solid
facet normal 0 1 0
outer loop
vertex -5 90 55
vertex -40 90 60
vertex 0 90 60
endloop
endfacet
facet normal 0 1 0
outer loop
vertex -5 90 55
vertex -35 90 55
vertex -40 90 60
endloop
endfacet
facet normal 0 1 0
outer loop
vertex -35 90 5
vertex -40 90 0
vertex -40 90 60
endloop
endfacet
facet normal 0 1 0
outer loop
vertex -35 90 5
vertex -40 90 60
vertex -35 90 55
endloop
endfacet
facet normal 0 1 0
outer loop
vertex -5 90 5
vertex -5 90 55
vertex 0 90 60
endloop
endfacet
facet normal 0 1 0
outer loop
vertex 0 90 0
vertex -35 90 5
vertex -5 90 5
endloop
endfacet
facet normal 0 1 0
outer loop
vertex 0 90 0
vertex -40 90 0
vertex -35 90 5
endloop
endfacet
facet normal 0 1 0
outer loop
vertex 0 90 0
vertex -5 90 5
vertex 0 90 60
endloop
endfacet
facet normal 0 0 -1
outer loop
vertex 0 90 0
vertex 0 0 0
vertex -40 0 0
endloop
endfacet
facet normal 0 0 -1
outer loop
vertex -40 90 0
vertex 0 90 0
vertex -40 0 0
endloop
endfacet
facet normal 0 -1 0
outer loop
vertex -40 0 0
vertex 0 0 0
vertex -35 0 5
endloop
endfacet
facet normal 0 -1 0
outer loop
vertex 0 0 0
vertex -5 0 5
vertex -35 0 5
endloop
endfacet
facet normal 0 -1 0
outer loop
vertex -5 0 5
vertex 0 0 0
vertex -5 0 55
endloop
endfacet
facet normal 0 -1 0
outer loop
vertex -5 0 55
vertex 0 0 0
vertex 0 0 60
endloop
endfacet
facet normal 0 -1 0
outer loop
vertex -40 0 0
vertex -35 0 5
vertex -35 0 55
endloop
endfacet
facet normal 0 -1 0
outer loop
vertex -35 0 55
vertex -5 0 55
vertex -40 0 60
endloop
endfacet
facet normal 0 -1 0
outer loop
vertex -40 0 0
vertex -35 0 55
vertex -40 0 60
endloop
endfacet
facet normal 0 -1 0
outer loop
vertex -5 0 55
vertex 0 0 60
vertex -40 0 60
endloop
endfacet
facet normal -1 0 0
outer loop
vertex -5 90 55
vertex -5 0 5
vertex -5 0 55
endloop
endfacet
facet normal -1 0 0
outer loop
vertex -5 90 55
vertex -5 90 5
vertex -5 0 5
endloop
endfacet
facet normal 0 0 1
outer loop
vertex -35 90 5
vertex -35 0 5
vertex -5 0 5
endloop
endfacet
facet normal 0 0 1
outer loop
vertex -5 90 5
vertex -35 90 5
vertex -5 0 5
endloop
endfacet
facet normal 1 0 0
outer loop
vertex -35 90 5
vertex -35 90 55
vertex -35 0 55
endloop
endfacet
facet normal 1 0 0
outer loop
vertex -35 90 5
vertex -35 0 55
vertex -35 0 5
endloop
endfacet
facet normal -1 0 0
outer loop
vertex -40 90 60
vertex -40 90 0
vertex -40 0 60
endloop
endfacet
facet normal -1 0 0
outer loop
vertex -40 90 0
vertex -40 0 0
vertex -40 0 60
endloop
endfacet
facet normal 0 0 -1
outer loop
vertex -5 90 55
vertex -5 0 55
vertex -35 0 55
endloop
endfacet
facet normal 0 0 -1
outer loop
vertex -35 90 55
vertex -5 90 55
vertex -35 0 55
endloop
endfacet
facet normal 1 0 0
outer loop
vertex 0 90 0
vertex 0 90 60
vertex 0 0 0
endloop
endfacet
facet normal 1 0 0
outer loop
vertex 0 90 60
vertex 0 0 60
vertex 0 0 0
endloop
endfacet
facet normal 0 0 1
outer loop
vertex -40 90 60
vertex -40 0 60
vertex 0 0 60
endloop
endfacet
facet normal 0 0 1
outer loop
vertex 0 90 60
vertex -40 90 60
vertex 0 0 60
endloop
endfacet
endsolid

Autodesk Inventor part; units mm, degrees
ref_plane "YZ Plane" through (0, 0, 0) normal (1, 0, 0) x (0, 1, 0)
ref_plane "XZ Plane" through (0, 0, 0) normal (0, 1, 0) x (-1, 0, 0)
ref_plane "XY Plane" through (0, 0, 0) normal (0, 0, 1) x (1, 0, 0)
sketch "Эскиз1" plane through (0, 0, 0) normal (0, 1, 0) x (-1, 0, 0)
  line L0 (0, 0) -> (40, 0)
  line L1 (40, 0) -> (40, 60)
  line L2 (40, 60) -> (0, 60)
  line L3 (0, 60) -> (0, 0)
  dimension "d0" = 60
  dimension "d1" = 40
extrude "Выдавливание1" add sketch "Эскиз1" along normal blind 190
sketch "Эскиз2" plane through (0, 190, 0) normal (0, 1, 0) x (1, 0, 0)
  line L0 (-35, -5) -> (-5, -5)
  line L1 (-5, -5) -> (-5, -55)
  line L2 (-5, -55) -> (-35, -55)
  line L3 (-35, -55) -> (-35, -5)
  line L4 (-40, 0) -> (-40, -60) projected
  line L5 (0, -60) -> (0, 0) projected
  line L6 (0, 0) -> (-40, 0) projected
  line L7 (-40, -60) -> (0, -60) projected
  dimension "d4" = 5
  dimension "d5" = 5
  dimension "d6" = 5
  dimension "d7" = 5
extrude "Выдавливание2" cut sketch "Эскиз2" against normal through all contours L0 L1 L2 L3
sketch "Эскиз3" plane through (-40, 0, 60) normal (0, 0, 1) x (1, 0, 0)
  point P0 (40, 0)
sketch "Эскиз5" plane through (0, 190, 0) normal (0, 1, 0) x (1, 0, 0)
  line L0 (-5, -5) -> (-5, -55) projected
  line L1 (-5, -55) -> (-35, -55) projected
  line L2 (-35, -55) -> (-35, -5) projected
  line L3 (-35, -5) -> (-5, -5) projected
  line L4 (-40, 0) -> (-40, -60) projected
  line L5 (-40, -60) -> (0, -60) projected
  line L6 (0, -60) -> (0, 0) projected
  line L7 (0, 0) -> (-40, 0) projected
extrude "Выдавливание4" cut sketch "Эскиз5" against normal blind 100
equation "\"d5\" = d4"
equation "\"d6\" = d4"
equation "\"d7\" = d4"
properties part number "БРУС"
